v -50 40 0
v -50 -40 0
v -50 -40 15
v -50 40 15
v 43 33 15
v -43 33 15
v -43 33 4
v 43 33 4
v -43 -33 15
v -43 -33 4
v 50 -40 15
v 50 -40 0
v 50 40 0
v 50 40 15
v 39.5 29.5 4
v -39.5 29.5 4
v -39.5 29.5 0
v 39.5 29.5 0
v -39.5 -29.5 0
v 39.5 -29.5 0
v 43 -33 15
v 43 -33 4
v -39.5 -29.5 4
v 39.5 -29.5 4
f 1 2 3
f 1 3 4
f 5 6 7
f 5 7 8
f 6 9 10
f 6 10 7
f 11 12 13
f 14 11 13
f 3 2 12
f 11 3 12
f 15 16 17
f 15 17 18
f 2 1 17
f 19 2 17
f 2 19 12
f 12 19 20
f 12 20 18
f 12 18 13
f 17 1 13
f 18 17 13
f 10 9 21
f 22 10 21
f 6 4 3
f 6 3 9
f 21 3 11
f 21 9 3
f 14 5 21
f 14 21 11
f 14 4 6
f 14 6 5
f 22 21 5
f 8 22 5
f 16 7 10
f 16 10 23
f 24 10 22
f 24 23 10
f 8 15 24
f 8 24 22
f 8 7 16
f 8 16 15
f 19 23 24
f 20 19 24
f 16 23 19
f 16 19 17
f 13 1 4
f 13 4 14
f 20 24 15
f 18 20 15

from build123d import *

# Parameters (mm, degrees)
F0_W     = 100
F0_H     = 80
F1_DEPTH = 15
F2_W     = 86
F2_H     = 66
F3_DEPTH = 11
F4_W     = 79
F4_H     = 59
F5_DEPTH = 4.001


with BuildPart() as f1:
    # F0 (on Top) → F1 (new body)
    with BuildSketch(Plane.XY):
        Rectangle(F0_W, F0_H)
    extrude(amount=F1_DEPTH)

    # F2 (on face) → F3 (cut)
    with BuildSketch(Plane.XY.offset(15)):
        Rectangle(F2_W, F2_H)
    extrude(amount=-F3_DEPTH, mode=Mode.SUBTRACT)

    # F4 (on face) → F5 (cut, through all)
    with BuildSketch(Plane.XY.offset(4)):
        Rectangle(F4_W, F4_H)
    extrude(amount=-F5_DEPTH, mode=Mode.SUBTRACT)


solid = f1.part
